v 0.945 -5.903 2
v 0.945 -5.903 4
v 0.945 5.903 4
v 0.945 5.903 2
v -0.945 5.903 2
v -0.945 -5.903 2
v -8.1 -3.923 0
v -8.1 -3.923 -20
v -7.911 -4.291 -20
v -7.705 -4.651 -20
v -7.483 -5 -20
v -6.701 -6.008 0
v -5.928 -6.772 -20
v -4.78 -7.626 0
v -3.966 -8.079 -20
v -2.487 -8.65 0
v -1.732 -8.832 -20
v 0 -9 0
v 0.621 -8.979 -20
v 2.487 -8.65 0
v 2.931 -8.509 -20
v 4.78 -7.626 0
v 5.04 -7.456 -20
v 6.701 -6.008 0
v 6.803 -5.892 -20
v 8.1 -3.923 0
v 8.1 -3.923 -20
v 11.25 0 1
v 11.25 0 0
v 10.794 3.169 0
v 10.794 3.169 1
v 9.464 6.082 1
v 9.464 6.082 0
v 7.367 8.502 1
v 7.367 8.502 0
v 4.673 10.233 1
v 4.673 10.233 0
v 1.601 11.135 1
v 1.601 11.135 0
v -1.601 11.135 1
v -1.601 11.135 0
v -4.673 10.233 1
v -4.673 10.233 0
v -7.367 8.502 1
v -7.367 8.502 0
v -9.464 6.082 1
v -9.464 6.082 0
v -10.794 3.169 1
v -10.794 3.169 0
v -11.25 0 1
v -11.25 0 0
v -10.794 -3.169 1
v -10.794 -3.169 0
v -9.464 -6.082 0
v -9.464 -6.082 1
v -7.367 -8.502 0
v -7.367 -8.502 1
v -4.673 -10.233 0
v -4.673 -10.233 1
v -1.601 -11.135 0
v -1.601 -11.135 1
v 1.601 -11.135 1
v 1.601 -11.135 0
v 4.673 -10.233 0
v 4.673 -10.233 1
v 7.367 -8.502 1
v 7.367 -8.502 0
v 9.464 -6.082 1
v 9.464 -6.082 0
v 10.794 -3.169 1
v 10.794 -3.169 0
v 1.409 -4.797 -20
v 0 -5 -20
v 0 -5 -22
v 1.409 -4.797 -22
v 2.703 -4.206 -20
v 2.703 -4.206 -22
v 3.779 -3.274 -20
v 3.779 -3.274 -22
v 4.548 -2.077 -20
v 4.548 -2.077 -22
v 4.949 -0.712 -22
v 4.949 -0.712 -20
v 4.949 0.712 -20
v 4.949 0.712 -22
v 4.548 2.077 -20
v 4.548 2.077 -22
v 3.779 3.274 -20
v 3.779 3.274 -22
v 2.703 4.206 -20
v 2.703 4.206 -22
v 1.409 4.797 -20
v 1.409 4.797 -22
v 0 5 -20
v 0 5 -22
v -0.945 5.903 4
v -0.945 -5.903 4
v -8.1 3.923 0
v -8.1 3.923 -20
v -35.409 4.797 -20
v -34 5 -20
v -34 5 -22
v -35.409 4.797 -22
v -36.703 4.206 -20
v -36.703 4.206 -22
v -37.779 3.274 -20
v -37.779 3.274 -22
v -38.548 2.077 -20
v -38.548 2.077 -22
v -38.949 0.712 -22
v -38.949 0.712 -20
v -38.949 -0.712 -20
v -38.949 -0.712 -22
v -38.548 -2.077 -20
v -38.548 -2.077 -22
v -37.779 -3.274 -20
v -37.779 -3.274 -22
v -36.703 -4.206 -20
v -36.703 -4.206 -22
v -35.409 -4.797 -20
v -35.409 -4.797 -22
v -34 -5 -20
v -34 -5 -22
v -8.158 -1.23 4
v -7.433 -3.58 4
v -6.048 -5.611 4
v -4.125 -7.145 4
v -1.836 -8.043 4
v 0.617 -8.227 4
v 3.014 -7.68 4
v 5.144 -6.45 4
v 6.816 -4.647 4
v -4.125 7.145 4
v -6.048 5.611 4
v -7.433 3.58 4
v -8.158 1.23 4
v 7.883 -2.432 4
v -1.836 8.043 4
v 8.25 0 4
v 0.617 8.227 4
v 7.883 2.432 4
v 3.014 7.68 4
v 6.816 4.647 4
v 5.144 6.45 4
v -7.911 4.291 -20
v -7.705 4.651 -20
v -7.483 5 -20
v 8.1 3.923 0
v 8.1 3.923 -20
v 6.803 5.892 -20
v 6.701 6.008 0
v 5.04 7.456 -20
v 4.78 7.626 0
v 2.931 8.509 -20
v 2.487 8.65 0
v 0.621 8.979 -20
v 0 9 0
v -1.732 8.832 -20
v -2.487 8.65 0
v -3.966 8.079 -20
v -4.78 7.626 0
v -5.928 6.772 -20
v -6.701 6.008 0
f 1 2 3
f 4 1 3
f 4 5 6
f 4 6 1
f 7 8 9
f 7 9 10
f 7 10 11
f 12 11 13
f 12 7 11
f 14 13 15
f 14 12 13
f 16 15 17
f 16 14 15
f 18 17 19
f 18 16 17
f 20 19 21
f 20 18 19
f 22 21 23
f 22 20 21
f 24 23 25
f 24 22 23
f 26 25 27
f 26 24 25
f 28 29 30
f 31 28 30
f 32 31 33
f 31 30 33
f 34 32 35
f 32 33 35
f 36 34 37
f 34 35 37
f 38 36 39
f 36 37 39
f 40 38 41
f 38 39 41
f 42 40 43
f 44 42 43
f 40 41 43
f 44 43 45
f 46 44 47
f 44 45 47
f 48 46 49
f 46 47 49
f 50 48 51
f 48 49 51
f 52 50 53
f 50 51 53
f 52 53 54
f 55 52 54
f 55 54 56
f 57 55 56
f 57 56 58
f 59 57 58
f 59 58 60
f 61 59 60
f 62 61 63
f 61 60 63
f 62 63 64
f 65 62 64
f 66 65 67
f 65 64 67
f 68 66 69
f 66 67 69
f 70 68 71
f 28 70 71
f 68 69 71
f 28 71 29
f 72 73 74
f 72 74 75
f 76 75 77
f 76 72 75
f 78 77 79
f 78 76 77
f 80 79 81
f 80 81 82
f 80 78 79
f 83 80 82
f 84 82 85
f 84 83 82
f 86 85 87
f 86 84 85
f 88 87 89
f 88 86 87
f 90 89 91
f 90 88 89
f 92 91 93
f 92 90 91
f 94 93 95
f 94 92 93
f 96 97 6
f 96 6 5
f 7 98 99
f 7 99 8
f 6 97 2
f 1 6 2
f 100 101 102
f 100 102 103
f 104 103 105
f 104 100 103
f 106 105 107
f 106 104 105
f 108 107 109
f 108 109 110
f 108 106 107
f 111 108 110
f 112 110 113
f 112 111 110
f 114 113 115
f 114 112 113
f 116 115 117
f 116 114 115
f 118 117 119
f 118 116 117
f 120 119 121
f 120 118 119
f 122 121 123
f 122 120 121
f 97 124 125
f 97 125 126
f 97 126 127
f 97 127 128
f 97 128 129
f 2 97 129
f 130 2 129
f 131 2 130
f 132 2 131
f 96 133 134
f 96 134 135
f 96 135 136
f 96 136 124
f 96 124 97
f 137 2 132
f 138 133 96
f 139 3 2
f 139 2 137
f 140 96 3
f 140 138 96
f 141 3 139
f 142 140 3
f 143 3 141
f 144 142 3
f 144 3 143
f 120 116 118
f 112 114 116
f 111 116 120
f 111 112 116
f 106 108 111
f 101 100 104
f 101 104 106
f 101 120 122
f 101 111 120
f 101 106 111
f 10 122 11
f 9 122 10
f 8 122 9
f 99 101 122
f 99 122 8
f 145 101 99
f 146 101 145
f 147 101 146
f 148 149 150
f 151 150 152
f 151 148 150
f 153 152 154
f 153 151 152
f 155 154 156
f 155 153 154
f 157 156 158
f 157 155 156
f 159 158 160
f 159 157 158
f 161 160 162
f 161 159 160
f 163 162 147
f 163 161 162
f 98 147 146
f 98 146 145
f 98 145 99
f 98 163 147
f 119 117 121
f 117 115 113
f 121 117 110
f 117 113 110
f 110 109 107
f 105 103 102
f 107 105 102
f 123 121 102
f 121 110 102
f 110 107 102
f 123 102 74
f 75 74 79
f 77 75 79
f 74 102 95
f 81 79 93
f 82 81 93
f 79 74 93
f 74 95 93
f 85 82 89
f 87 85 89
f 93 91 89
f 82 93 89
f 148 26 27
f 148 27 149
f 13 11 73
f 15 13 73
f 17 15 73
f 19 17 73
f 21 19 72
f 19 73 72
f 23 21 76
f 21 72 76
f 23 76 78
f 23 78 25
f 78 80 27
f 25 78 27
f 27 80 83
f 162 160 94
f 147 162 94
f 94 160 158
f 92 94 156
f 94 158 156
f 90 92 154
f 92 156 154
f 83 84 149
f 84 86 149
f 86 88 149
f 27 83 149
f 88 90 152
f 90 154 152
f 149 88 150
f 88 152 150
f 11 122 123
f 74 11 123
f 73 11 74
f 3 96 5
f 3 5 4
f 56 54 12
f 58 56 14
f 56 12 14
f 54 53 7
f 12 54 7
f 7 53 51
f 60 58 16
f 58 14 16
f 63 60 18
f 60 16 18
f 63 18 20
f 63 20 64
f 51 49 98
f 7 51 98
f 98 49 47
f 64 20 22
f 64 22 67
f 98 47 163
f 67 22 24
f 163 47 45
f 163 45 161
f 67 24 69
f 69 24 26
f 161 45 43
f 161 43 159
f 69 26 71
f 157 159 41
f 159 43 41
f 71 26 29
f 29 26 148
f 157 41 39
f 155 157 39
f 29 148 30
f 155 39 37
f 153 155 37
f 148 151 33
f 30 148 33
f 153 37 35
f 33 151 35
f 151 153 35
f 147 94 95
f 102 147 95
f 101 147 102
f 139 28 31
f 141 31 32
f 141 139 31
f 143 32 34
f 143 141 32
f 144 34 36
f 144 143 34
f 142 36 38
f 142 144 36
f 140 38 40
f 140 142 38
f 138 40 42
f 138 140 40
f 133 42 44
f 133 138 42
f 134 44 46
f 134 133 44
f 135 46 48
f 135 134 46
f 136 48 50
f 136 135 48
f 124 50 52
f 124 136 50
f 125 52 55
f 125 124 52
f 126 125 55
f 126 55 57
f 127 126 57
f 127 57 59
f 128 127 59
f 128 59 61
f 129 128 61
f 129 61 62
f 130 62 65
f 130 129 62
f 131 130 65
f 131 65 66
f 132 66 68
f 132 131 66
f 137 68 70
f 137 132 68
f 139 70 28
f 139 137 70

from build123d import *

# Parameters (mm, degrees)
SKETCH_1_R          = 11.25
EXTRUDE_1_DEPTH     = 4
SKETCH_2_W          = 1.89000918
SKETCH_2_H          = 11.806467468
CUT_EXTRUDE_1_DEPTH = 2
EXTRUDE_2_DEPTH     = 20
EXTRUDE_3_DEPTH     = 2
CHAMFER_1_SIZE      = 3


with BuildPart() as part:
    # 草图1 → 凸台-拉伸1 (new body)
    with BuildSketch(Plane.XY):
        Circle(SKETCH_1_R)
    extrude(amount=EXTRUDE_1_DEPTH)

    # 草图2 → 切除-拉伸1 (cut)
    with BuildSketch(Plane.XY.offset(4)):
        Rectangle(SKETCH_2_W, SKETCH_2_H)
    extrude(amount=-CUT_EXTRUDE_1_DEPTH, mode=Mode.SUBTRACT)

    # 草图3 → 凸台-拉伸2 (add)
    with BuildSketch(Plane(origin=(0, 0, 0), x_dir=(-1, 0, 0), z_dir=(0, 0, -1))):
        with BuildLine():
            Line((-8.1, -3.923009049), (-8.1, 3.923009049))
            ThreePointArc((-8.1, 3.923009049), (0, 9), (8.1, 3.923009049))
            Line((8.1, 3.923009049), (8.1, -3.923009049))
            ThreePointArc((8.1, -3.923009049), (0, -9), (-8.1, -3.923009049))
        make_face()
    extrude(amount=EXTRUDE_2_DEPTH)

    # 草图4 → 凸台-拉伸3 (add)
    with BuildSketch(Plane(origin=(0, 0, -20), x_dir=(-1, 0, 0), z_dir=(0, 0, -1))):
        with BuildLine():
            Line((0, 5), (34, 5))
            ThreePointArc((34, 5), (39, 0), (34, -5))
            Line((34, -5), (0, -5))
            ThreePointArc((0, -5), (-5, 0), (0, 5))
        make_face()
    extrude(amount=EXTRUDE_3_DEPTH)

    # 倒角1
    chamfer_1_edges = [part.edges().sort_by_distance(p)[0] for p in [
        (-11.25, 0, 4),
    ]]
    chamfer(chamfer_1_edges, length=CHAMFER_1_SIZE)


solid = part.part
